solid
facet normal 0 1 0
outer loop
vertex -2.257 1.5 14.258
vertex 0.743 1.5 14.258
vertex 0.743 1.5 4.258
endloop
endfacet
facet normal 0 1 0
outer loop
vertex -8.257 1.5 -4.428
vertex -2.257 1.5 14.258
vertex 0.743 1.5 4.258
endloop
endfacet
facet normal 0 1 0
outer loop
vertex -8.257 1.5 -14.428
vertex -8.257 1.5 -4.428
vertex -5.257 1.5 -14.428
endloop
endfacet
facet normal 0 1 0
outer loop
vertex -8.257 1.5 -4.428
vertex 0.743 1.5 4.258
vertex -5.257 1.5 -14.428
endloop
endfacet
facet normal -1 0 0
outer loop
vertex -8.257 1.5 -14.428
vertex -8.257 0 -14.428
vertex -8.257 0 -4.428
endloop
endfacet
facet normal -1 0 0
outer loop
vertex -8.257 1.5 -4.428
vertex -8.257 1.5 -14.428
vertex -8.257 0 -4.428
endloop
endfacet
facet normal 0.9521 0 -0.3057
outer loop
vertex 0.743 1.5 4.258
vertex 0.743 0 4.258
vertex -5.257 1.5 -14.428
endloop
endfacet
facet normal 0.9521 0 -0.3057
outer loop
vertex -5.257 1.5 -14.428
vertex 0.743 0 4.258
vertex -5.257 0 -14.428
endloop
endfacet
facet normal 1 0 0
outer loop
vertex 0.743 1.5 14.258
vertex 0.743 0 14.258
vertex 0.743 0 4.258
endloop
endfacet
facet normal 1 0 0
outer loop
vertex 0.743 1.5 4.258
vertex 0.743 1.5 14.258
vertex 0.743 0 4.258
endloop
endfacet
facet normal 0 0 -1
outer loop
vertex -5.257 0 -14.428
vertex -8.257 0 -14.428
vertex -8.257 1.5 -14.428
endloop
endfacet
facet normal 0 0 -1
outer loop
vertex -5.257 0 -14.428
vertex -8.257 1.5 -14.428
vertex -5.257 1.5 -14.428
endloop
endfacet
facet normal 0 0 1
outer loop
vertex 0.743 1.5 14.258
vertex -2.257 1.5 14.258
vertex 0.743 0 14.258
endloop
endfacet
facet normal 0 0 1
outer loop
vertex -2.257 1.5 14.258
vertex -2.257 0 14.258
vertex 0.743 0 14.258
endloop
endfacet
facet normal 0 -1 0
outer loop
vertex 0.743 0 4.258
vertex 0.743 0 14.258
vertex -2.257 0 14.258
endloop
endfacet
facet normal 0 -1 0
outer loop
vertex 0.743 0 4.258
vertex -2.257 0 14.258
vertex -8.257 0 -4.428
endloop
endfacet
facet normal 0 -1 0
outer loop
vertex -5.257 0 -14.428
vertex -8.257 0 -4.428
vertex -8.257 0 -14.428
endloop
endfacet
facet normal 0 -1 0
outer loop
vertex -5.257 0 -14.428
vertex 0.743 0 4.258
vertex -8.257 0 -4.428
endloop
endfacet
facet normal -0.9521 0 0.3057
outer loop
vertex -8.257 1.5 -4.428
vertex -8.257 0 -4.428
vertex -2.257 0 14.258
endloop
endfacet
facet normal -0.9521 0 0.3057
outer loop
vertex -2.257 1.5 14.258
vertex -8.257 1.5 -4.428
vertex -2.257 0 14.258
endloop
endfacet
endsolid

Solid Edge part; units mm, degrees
sketch "Sketch1" plane through (0, 0, 0) normal (0, -1, 0) x (1, 0, 0)
  line L0 (-8.2572, -14.4281) -> (-5.2572, -14.4281)
  line L1 (0.7428, 4.2582) -> (-5.2572, -14.4281)
  line L2 (0.7428, 14.2582) -> (0.7428, 4.2582)
  line L3 (-2.2572, 14.2582) -> (0.7428, 14.2582)
  line L4 (-8.2572, -4.4281) -> (-2.2572, 14.2582)
  line L5 (-8.2572, -14.4281) -> (-8.2572, -4.4281)
  dimension "D1" = 2
  dimension "D2" = 2
  dimension "D3" = 2
  dimension "D4" = 10
extrude "Protrusion1" add sketch "Sketch1" against normal blind 1.5
